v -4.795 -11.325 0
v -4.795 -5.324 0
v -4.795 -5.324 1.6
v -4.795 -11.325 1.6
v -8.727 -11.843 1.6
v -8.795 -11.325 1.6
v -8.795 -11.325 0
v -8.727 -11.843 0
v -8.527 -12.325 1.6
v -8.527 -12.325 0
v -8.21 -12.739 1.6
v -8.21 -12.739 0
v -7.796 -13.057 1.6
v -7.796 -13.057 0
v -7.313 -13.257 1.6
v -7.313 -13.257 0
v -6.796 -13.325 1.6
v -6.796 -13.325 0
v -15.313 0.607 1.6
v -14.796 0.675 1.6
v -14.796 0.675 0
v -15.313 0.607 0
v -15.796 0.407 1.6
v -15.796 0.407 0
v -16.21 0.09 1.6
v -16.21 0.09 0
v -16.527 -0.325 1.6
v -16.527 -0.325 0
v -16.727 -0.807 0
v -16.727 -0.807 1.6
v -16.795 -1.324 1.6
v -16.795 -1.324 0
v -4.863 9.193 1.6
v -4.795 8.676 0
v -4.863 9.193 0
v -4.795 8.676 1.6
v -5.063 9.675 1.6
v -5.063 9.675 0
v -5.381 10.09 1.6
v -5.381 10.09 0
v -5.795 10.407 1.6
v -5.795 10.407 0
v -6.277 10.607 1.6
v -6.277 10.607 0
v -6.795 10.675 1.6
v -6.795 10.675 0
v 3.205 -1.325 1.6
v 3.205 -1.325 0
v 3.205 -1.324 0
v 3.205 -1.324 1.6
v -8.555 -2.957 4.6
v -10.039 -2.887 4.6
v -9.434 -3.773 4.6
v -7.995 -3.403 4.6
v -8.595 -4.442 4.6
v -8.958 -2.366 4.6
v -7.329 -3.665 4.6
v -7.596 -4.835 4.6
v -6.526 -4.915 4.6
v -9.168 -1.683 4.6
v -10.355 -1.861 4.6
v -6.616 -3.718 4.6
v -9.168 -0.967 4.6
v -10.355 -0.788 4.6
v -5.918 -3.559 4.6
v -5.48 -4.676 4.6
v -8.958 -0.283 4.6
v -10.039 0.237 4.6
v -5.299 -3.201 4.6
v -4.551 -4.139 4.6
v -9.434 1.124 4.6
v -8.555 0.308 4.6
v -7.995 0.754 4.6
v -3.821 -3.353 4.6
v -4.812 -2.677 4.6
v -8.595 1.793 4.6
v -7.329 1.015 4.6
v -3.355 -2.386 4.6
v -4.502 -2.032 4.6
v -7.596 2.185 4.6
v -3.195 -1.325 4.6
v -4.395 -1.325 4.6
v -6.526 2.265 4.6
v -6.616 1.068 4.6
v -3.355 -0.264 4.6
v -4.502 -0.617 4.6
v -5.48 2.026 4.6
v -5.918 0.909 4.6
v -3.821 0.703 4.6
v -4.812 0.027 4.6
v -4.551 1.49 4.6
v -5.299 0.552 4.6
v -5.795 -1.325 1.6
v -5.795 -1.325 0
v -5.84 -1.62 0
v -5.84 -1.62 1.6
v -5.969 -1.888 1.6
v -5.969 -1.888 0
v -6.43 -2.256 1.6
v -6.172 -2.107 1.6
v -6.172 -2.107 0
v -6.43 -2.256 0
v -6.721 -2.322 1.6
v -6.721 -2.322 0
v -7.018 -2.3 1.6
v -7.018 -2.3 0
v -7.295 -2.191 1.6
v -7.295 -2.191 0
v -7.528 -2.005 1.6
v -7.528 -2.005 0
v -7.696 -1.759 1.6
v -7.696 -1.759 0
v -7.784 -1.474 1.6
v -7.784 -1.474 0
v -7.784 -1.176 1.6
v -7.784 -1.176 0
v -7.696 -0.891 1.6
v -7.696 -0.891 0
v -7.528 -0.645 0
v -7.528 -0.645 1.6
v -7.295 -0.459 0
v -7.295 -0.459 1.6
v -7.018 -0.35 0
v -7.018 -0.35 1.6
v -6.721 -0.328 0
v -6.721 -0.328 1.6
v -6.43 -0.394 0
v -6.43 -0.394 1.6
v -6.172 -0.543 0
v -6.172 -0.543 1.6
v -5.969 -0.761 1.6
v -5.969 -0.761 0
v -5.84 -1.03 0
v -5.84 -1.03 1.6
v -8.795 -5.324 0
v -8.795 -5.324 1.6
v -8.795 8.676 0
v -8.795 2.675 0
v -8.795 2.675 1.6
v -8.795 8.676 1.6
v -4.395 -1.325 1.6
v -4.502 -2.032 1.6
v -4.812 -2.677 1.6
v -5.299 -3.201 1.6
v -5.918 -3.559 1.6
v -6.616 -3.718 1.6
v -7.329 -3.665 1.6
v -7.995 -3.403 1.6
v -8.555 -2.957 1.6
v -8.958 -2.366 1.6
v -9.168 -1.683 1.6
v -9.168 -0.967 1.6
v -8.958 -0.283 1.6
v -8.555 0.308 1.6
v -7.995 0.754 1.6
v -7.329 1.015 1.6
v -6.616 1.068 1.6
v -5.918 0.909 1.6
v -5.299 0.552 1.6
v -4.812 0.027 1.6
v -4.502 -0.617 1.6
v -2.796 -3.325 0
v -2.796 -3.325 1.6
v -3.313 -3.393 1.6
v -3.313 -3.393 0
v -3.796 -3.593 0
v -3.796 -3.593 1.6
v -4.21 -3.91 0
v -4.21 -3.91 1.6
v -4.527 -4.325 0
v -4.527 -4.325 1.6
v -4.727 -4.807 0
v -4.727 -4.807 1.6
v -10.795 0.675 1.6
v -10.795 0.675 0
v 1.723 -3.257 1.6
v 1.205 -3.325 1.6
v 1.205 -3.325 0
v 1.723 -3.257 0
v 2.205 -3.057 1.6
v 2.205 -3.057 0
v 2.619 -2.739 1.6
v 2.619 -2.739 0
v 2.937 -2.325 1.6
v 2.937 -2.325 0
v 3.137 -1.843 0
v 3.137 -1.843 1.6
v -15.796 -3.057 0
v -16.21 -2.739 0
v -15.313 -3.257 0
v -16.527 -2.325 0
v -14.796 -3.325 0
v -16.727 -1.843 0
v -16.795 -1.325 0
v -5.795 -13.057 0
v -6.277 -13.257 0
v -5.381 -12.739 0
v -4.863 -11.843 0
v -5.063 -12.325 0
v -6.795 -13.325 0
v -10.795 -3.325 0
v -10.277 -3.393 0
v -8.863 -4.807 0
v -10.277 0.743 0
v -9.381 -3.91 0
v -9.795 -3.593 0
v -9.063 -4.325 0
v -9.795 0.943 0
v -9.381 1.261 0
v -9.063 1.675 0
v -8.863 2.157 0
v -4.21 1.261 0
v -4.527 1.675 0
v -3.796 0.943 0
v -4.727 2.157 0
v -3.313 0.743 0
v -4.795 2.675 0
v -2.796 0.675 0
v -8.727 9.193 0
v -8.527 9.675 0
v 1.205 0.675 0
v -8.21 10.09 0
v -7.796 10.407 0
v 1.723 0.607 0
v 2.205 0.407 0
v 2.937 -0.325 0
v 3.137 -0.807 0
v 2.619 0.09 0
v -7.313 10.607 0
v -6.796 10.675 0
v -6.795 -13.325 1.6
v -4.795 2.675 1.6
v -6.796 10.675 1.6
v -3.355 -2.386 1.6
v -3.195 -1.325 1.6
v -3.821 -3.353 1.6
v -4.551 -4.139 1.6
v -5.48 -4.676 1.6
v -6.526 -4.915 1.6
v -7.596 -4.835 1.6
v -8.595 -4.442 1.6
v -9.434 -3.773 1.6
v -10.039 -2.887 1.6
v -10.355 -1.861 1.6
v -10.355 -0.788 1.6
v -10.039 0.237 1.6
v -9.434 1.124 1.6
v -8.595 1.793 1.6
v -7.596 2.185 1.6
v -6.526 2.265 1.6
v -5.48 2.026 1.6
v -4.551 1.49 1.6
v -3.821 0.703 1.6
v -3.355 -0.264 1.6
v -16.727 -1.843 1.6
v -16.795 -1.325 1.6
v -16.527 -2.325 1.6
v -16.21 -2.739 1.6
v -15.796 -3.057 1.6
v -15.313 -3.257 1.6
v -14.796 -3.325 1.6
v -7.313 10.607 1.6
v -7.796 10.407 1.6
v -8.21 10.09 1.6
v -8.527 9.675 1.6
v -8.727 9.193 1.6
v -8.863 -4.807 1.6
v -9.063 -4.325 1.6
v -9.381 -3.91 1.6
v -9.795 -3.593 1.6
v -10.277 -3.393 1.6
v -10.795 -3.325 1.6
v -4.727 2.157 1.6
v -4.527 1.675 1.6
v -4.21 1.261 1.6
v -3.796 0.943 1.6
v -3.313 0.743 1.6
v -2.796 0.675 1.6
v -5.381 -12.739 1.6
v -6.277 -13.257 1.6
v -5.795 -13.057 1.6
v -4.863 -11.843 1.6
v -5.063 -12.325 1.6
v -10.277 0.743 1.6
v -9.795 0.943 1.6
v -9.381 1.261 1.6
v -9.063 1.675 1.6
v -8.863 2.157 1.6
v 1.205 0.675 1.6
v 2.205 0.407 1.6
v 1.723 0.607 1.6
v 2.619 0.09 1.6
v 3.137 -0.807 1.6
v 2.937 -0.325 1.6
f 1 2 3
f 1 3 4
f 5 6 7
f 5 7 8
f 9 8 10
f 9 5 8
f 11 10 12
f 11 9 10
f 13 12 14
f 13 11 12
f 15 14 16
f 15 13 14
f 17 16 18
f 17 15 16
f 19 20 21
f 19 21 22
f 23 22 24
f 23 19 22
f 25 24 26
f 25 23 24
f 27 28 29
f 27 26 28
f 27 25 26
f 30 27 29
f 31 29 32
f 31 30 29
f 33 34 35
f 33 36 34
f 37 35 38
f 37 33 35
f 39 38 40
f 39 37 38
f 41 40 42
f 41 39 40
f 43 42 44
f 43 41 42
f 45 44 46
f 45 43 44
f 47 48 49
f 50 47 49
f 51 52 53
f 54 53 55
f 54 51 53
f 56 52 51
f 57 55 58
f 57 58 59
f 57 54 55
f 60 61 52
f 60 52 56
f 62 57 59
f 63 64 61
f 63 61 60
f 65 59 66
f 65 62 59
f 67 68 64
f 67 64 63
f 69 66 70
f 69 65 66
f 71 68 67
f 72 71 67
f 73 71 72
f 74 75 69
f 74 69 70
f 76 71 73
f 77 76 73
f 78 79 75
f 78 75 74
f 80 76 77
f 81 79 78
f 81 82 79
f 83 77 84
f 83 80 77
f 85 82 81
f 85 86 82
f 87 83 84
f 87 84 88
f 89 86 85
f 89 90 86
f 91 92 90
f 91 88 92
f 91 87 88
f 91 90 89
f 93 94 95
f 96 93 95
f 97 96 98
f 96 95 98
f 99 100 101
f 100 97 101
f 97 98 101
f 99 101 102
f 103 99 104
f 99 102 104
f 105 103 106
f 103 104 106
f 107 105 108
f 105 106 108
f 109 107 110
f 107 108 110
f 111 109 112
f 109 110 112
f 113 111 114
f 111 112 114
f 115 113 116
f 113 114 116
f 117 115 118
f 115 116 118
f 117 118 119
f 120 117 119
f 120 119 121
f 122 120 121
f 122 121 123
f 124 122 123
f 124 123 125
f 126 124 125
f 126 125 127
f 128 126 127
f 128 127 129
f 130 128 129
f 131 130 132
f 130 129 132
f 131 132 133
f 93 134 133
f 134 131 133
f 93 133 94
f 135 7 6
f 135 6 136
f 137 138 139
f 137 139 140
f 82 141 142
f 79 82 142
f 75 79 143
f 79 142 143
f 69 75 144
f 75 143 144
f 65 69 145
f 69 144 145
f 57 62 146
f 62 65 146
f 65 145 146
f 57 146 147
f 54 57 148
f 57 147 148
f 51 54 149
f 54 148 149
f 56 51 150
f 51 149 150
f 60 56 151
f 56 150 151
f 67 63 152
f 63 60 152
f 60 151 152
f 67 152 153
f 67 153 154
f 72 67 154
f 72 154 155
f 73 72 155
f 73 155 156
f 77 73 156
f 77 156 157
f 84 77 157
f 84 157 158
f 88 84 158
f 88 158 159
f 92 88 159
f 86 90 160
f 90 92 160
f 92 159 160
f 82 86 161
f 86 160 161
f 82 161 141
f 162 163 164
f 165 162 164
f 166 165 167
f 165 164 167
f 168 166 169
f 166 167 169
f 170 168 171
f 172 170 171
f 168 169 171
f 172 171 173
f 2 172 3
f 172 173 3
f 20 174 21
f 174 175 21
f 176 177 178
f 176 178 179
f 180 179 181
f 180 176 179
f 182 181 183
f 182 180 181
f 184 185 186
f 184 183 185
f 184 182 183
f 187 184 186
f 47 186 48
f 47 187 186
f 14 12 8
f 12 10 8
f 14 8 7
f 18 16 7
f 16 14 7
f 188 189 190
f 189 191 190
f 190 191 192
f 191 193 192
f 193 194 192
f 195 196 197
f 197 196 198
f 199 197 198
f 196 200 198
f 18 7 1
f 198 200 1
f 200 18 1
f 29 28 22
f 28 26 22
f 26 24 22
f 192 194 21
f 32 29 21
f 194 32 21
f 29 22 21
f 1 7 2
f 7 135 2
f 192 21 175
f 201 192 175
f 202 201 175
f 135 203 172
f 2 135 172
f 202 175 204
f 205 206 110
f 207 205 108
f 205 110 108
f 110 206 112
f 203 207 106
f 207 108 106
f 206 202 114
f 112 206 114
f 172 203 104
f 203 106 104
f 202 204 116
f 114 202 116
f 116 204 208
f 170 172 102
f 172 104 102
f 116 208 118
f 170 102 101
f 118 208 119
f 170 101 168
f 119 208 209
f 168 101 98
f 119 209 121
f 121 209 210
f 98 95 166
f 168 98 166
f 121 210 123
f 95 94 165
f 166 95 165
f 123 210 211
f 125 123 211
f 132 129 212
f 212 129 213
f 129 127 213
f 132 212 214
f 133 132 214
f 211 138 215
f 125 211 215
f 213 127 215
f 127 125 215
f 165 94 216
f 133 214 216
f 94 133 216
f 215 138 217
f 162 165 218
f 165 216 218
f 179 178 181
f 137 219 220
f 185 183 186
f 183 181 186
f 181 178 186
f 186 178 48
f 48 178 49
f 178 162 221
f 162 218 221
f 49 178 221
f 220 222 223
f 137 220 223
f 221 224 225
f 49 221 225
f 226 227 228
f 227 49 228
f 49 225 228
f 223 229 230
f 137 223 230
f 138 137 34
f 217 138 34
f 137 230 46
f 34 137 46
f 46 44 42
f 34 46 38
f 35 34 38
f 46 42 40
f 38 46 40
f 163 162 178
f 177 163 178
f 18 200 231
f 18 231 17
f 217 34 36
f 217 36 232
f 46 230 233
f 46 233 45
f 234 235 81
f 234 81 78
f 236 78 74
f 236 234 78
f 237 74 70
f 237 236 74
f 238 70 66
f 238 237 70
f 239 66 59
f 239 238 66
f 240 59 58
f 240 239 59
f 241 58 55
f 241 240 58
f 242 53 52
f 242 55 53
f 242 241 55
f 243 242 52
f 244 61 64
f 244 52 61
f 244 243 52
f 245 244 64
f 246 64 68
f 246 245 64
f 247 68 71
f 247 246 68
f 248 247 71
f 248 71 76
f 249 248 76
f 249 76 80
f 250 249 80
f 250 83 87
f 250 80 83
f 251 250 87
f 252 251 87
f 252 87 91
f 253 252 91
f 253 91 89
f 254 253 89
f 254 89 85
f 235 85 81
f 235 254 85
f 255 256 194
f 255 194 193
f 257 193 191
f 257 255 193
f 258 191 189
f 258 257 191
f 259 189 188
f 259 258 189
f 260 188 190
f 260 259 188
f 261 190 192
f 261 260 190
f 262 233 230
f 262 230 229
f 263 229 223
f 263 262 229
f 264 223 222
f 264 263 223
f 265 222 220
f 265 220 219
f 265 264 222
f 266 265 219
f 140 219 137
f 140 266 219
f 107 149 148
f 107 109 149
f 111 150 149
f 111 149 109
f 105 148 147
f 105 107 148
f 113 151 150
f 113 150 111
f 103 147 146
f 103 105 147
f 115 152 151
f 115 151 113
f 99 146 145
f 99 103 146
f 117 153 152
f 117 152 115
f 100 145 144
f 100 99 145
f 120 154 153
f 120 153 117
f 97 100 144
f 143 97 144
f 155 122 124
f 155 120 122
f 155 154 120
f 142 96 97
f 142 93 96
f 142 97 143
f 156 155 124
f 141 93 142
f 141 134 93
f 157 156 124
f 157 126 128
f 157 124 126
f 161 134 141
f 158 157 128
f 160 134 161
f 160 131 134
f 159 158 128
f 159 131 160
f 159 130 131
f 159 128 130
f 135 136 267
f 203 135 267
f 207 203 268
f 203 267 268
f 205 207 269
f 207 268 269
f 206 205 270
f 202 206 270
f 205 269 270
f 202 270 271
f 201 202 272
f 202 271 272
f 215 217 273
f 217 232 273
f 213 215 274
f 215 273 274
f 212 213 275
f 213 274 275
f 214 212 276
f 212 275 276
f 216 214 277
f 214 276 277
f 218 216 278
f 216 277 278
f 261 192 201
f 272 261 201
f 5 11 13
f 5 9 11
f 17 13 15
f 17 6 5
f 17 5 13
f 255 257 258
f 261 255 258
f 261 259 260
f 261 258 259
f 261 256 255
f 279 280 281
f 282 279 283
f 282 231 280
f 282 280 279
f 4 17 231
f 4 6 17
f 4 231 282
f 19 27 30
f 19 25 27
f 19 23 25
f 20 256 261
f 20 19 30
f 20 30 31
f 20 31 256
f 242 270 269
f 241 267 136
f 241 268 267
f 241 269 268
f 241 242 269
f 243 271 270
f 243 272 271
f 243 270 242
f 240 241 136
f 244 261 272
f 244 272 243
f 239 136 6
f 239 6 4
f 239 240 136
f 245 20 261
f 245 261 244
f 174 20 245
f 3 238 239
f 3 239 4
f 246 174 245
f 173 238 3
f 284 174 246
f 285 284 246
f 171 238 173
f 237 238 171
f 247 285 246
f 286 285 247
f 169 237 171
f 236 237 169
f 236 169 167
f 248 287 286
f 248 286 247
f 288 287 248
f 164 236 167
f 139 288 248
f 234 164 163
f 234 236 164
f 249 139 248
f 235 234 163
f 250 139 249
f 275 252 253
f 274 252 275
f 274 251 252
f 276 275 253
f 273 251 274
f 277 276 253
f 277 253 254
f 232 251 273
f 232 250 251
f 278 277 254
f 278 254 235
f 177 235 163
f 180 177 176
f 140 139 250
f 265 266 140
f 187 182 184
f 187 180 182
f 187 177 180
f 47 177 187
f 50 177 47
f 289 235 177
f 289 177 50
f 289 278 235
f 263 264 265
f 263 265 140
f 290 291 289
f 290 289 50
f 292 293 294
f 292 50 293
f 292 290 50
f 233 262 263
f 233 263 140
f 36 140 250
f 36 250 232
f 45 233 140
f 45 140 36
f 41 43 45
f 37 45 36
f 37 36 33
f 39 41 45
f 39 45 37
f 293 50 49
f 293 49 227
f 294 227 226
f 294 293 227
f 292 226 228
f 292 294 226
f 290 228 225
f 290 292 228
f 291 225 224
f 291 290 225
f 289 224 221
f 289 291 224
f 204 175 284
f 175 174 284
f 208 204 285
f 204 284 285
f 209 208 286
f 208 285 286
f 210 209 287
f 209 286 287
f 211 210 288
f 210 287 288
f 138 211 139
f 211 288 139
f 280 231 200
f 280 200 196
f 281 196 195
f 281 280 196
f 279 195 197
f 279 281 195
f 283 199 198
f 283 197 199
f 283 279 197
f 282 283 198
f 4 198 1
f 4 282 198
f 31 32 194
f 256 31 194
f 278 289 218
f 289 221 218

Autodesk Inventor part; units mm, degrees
ref_plane "YZ Plane" through (0, 0, 0) normal (1, 0, 0) x (0, 1, 0)
ref_plane "XZ Plane" through (0, 0, 0) normal (0, 1, 0) x (-1, 0, 0)
ref_plane "XY Plane" through (0, 0, 0) normal (0, 0, 1) x (1, 0, 0)
sketch "Esquisse1" plane through (0, 0, 0) normal (0, 0, 1) x (1, 0, 0)
  line L0 (-8.7953, 10.6752) -> (-4.7953, 10.6752)
  line L1 (-4.7953, -13.3248) -> (-8.7953, -13.3248)
  line L2 (3.2047, -3.3248) -> (3.2047, 0.6752)
  line L3 (-16.7953, 0.6752) -> (-16.7953, -3.3248)
  line L4 (3.2047, 0.6752) -> (-4.7953, 0.6752)
  line L5 (-8.7953, 0.6752) -> (-16.7953, 0.6752)
  line L6 (-4.7953, 10.6752) -> (-4.7953, 0.6752)
  line L7 (-4.7953, -3.3248) -> (-4.7953, -13.3248)
  line L8 (-16.7953, -3.3248) -> (-8.7953, -3.3248)
  line L9 (-4.7953, -3.3248) -> (3.2047, -3.3248)
  line L10 (-8.7953, -13.3248) -> (-8.7953, -3.3248)
  line L11 (-8.7953, 0.6752) -> (-8.7953, 10.6752)
  line L12 (-8.7953, 0.6752) -> (-4.7953, -3.3248) construction
  line L13 (-8.7953, -3.3248) -> (-4.7953, 0.6752) construction
  circle A0 centre (-6.7953, -1.3248) radius 1
  dimension "d0" = 10
  dimension "d1" = 8
  dimension "d2" = 4
  dimension "d5" = 2
extrude "Extrusion2" add sketch "Esquisse1" along normal blind 1.6
fillet "Congé1" radius 2 12 edges at (-8.7953, 0.6752, 0.8) (-8.7953, -3.3248, 0.8) (-16.7953, -3.3248, 0.8) (-16.7953, 0.6752, 0.8) (-8.7953, 10.6752, 0.8) (-4.7953, 10.6752, 0.8) (-4.7953, 0.6752, 0.8) (3.2047, 0.6752, 0.8) (3.2047, -3.3248, 0.8) (-4.7953, -3.3248, 0.8) (-4.7953, -13.3248, 0.8) (-8.7953, -13.3248, 0.8)
sketch "Esquisse2" plane through (0, 0, 1.6) normal (0, 0, 1) x (1, 0, 0)
  circle A0 centre (-6.7953, -1.3248) radius 1 construction
  circle A1 centre (-6.7953, -1.3248) radius 3.6
  circle A2 centre (-6.7953, -1.3248) radius 2.4
  point P0 (0, 0)
  dimension "d8" = 1.2
  dimension "d9" = 7.2
extrude "Extrusion3" add sketch "Esquisse2" along normal blind 3
properties part number "CoronaArm"
